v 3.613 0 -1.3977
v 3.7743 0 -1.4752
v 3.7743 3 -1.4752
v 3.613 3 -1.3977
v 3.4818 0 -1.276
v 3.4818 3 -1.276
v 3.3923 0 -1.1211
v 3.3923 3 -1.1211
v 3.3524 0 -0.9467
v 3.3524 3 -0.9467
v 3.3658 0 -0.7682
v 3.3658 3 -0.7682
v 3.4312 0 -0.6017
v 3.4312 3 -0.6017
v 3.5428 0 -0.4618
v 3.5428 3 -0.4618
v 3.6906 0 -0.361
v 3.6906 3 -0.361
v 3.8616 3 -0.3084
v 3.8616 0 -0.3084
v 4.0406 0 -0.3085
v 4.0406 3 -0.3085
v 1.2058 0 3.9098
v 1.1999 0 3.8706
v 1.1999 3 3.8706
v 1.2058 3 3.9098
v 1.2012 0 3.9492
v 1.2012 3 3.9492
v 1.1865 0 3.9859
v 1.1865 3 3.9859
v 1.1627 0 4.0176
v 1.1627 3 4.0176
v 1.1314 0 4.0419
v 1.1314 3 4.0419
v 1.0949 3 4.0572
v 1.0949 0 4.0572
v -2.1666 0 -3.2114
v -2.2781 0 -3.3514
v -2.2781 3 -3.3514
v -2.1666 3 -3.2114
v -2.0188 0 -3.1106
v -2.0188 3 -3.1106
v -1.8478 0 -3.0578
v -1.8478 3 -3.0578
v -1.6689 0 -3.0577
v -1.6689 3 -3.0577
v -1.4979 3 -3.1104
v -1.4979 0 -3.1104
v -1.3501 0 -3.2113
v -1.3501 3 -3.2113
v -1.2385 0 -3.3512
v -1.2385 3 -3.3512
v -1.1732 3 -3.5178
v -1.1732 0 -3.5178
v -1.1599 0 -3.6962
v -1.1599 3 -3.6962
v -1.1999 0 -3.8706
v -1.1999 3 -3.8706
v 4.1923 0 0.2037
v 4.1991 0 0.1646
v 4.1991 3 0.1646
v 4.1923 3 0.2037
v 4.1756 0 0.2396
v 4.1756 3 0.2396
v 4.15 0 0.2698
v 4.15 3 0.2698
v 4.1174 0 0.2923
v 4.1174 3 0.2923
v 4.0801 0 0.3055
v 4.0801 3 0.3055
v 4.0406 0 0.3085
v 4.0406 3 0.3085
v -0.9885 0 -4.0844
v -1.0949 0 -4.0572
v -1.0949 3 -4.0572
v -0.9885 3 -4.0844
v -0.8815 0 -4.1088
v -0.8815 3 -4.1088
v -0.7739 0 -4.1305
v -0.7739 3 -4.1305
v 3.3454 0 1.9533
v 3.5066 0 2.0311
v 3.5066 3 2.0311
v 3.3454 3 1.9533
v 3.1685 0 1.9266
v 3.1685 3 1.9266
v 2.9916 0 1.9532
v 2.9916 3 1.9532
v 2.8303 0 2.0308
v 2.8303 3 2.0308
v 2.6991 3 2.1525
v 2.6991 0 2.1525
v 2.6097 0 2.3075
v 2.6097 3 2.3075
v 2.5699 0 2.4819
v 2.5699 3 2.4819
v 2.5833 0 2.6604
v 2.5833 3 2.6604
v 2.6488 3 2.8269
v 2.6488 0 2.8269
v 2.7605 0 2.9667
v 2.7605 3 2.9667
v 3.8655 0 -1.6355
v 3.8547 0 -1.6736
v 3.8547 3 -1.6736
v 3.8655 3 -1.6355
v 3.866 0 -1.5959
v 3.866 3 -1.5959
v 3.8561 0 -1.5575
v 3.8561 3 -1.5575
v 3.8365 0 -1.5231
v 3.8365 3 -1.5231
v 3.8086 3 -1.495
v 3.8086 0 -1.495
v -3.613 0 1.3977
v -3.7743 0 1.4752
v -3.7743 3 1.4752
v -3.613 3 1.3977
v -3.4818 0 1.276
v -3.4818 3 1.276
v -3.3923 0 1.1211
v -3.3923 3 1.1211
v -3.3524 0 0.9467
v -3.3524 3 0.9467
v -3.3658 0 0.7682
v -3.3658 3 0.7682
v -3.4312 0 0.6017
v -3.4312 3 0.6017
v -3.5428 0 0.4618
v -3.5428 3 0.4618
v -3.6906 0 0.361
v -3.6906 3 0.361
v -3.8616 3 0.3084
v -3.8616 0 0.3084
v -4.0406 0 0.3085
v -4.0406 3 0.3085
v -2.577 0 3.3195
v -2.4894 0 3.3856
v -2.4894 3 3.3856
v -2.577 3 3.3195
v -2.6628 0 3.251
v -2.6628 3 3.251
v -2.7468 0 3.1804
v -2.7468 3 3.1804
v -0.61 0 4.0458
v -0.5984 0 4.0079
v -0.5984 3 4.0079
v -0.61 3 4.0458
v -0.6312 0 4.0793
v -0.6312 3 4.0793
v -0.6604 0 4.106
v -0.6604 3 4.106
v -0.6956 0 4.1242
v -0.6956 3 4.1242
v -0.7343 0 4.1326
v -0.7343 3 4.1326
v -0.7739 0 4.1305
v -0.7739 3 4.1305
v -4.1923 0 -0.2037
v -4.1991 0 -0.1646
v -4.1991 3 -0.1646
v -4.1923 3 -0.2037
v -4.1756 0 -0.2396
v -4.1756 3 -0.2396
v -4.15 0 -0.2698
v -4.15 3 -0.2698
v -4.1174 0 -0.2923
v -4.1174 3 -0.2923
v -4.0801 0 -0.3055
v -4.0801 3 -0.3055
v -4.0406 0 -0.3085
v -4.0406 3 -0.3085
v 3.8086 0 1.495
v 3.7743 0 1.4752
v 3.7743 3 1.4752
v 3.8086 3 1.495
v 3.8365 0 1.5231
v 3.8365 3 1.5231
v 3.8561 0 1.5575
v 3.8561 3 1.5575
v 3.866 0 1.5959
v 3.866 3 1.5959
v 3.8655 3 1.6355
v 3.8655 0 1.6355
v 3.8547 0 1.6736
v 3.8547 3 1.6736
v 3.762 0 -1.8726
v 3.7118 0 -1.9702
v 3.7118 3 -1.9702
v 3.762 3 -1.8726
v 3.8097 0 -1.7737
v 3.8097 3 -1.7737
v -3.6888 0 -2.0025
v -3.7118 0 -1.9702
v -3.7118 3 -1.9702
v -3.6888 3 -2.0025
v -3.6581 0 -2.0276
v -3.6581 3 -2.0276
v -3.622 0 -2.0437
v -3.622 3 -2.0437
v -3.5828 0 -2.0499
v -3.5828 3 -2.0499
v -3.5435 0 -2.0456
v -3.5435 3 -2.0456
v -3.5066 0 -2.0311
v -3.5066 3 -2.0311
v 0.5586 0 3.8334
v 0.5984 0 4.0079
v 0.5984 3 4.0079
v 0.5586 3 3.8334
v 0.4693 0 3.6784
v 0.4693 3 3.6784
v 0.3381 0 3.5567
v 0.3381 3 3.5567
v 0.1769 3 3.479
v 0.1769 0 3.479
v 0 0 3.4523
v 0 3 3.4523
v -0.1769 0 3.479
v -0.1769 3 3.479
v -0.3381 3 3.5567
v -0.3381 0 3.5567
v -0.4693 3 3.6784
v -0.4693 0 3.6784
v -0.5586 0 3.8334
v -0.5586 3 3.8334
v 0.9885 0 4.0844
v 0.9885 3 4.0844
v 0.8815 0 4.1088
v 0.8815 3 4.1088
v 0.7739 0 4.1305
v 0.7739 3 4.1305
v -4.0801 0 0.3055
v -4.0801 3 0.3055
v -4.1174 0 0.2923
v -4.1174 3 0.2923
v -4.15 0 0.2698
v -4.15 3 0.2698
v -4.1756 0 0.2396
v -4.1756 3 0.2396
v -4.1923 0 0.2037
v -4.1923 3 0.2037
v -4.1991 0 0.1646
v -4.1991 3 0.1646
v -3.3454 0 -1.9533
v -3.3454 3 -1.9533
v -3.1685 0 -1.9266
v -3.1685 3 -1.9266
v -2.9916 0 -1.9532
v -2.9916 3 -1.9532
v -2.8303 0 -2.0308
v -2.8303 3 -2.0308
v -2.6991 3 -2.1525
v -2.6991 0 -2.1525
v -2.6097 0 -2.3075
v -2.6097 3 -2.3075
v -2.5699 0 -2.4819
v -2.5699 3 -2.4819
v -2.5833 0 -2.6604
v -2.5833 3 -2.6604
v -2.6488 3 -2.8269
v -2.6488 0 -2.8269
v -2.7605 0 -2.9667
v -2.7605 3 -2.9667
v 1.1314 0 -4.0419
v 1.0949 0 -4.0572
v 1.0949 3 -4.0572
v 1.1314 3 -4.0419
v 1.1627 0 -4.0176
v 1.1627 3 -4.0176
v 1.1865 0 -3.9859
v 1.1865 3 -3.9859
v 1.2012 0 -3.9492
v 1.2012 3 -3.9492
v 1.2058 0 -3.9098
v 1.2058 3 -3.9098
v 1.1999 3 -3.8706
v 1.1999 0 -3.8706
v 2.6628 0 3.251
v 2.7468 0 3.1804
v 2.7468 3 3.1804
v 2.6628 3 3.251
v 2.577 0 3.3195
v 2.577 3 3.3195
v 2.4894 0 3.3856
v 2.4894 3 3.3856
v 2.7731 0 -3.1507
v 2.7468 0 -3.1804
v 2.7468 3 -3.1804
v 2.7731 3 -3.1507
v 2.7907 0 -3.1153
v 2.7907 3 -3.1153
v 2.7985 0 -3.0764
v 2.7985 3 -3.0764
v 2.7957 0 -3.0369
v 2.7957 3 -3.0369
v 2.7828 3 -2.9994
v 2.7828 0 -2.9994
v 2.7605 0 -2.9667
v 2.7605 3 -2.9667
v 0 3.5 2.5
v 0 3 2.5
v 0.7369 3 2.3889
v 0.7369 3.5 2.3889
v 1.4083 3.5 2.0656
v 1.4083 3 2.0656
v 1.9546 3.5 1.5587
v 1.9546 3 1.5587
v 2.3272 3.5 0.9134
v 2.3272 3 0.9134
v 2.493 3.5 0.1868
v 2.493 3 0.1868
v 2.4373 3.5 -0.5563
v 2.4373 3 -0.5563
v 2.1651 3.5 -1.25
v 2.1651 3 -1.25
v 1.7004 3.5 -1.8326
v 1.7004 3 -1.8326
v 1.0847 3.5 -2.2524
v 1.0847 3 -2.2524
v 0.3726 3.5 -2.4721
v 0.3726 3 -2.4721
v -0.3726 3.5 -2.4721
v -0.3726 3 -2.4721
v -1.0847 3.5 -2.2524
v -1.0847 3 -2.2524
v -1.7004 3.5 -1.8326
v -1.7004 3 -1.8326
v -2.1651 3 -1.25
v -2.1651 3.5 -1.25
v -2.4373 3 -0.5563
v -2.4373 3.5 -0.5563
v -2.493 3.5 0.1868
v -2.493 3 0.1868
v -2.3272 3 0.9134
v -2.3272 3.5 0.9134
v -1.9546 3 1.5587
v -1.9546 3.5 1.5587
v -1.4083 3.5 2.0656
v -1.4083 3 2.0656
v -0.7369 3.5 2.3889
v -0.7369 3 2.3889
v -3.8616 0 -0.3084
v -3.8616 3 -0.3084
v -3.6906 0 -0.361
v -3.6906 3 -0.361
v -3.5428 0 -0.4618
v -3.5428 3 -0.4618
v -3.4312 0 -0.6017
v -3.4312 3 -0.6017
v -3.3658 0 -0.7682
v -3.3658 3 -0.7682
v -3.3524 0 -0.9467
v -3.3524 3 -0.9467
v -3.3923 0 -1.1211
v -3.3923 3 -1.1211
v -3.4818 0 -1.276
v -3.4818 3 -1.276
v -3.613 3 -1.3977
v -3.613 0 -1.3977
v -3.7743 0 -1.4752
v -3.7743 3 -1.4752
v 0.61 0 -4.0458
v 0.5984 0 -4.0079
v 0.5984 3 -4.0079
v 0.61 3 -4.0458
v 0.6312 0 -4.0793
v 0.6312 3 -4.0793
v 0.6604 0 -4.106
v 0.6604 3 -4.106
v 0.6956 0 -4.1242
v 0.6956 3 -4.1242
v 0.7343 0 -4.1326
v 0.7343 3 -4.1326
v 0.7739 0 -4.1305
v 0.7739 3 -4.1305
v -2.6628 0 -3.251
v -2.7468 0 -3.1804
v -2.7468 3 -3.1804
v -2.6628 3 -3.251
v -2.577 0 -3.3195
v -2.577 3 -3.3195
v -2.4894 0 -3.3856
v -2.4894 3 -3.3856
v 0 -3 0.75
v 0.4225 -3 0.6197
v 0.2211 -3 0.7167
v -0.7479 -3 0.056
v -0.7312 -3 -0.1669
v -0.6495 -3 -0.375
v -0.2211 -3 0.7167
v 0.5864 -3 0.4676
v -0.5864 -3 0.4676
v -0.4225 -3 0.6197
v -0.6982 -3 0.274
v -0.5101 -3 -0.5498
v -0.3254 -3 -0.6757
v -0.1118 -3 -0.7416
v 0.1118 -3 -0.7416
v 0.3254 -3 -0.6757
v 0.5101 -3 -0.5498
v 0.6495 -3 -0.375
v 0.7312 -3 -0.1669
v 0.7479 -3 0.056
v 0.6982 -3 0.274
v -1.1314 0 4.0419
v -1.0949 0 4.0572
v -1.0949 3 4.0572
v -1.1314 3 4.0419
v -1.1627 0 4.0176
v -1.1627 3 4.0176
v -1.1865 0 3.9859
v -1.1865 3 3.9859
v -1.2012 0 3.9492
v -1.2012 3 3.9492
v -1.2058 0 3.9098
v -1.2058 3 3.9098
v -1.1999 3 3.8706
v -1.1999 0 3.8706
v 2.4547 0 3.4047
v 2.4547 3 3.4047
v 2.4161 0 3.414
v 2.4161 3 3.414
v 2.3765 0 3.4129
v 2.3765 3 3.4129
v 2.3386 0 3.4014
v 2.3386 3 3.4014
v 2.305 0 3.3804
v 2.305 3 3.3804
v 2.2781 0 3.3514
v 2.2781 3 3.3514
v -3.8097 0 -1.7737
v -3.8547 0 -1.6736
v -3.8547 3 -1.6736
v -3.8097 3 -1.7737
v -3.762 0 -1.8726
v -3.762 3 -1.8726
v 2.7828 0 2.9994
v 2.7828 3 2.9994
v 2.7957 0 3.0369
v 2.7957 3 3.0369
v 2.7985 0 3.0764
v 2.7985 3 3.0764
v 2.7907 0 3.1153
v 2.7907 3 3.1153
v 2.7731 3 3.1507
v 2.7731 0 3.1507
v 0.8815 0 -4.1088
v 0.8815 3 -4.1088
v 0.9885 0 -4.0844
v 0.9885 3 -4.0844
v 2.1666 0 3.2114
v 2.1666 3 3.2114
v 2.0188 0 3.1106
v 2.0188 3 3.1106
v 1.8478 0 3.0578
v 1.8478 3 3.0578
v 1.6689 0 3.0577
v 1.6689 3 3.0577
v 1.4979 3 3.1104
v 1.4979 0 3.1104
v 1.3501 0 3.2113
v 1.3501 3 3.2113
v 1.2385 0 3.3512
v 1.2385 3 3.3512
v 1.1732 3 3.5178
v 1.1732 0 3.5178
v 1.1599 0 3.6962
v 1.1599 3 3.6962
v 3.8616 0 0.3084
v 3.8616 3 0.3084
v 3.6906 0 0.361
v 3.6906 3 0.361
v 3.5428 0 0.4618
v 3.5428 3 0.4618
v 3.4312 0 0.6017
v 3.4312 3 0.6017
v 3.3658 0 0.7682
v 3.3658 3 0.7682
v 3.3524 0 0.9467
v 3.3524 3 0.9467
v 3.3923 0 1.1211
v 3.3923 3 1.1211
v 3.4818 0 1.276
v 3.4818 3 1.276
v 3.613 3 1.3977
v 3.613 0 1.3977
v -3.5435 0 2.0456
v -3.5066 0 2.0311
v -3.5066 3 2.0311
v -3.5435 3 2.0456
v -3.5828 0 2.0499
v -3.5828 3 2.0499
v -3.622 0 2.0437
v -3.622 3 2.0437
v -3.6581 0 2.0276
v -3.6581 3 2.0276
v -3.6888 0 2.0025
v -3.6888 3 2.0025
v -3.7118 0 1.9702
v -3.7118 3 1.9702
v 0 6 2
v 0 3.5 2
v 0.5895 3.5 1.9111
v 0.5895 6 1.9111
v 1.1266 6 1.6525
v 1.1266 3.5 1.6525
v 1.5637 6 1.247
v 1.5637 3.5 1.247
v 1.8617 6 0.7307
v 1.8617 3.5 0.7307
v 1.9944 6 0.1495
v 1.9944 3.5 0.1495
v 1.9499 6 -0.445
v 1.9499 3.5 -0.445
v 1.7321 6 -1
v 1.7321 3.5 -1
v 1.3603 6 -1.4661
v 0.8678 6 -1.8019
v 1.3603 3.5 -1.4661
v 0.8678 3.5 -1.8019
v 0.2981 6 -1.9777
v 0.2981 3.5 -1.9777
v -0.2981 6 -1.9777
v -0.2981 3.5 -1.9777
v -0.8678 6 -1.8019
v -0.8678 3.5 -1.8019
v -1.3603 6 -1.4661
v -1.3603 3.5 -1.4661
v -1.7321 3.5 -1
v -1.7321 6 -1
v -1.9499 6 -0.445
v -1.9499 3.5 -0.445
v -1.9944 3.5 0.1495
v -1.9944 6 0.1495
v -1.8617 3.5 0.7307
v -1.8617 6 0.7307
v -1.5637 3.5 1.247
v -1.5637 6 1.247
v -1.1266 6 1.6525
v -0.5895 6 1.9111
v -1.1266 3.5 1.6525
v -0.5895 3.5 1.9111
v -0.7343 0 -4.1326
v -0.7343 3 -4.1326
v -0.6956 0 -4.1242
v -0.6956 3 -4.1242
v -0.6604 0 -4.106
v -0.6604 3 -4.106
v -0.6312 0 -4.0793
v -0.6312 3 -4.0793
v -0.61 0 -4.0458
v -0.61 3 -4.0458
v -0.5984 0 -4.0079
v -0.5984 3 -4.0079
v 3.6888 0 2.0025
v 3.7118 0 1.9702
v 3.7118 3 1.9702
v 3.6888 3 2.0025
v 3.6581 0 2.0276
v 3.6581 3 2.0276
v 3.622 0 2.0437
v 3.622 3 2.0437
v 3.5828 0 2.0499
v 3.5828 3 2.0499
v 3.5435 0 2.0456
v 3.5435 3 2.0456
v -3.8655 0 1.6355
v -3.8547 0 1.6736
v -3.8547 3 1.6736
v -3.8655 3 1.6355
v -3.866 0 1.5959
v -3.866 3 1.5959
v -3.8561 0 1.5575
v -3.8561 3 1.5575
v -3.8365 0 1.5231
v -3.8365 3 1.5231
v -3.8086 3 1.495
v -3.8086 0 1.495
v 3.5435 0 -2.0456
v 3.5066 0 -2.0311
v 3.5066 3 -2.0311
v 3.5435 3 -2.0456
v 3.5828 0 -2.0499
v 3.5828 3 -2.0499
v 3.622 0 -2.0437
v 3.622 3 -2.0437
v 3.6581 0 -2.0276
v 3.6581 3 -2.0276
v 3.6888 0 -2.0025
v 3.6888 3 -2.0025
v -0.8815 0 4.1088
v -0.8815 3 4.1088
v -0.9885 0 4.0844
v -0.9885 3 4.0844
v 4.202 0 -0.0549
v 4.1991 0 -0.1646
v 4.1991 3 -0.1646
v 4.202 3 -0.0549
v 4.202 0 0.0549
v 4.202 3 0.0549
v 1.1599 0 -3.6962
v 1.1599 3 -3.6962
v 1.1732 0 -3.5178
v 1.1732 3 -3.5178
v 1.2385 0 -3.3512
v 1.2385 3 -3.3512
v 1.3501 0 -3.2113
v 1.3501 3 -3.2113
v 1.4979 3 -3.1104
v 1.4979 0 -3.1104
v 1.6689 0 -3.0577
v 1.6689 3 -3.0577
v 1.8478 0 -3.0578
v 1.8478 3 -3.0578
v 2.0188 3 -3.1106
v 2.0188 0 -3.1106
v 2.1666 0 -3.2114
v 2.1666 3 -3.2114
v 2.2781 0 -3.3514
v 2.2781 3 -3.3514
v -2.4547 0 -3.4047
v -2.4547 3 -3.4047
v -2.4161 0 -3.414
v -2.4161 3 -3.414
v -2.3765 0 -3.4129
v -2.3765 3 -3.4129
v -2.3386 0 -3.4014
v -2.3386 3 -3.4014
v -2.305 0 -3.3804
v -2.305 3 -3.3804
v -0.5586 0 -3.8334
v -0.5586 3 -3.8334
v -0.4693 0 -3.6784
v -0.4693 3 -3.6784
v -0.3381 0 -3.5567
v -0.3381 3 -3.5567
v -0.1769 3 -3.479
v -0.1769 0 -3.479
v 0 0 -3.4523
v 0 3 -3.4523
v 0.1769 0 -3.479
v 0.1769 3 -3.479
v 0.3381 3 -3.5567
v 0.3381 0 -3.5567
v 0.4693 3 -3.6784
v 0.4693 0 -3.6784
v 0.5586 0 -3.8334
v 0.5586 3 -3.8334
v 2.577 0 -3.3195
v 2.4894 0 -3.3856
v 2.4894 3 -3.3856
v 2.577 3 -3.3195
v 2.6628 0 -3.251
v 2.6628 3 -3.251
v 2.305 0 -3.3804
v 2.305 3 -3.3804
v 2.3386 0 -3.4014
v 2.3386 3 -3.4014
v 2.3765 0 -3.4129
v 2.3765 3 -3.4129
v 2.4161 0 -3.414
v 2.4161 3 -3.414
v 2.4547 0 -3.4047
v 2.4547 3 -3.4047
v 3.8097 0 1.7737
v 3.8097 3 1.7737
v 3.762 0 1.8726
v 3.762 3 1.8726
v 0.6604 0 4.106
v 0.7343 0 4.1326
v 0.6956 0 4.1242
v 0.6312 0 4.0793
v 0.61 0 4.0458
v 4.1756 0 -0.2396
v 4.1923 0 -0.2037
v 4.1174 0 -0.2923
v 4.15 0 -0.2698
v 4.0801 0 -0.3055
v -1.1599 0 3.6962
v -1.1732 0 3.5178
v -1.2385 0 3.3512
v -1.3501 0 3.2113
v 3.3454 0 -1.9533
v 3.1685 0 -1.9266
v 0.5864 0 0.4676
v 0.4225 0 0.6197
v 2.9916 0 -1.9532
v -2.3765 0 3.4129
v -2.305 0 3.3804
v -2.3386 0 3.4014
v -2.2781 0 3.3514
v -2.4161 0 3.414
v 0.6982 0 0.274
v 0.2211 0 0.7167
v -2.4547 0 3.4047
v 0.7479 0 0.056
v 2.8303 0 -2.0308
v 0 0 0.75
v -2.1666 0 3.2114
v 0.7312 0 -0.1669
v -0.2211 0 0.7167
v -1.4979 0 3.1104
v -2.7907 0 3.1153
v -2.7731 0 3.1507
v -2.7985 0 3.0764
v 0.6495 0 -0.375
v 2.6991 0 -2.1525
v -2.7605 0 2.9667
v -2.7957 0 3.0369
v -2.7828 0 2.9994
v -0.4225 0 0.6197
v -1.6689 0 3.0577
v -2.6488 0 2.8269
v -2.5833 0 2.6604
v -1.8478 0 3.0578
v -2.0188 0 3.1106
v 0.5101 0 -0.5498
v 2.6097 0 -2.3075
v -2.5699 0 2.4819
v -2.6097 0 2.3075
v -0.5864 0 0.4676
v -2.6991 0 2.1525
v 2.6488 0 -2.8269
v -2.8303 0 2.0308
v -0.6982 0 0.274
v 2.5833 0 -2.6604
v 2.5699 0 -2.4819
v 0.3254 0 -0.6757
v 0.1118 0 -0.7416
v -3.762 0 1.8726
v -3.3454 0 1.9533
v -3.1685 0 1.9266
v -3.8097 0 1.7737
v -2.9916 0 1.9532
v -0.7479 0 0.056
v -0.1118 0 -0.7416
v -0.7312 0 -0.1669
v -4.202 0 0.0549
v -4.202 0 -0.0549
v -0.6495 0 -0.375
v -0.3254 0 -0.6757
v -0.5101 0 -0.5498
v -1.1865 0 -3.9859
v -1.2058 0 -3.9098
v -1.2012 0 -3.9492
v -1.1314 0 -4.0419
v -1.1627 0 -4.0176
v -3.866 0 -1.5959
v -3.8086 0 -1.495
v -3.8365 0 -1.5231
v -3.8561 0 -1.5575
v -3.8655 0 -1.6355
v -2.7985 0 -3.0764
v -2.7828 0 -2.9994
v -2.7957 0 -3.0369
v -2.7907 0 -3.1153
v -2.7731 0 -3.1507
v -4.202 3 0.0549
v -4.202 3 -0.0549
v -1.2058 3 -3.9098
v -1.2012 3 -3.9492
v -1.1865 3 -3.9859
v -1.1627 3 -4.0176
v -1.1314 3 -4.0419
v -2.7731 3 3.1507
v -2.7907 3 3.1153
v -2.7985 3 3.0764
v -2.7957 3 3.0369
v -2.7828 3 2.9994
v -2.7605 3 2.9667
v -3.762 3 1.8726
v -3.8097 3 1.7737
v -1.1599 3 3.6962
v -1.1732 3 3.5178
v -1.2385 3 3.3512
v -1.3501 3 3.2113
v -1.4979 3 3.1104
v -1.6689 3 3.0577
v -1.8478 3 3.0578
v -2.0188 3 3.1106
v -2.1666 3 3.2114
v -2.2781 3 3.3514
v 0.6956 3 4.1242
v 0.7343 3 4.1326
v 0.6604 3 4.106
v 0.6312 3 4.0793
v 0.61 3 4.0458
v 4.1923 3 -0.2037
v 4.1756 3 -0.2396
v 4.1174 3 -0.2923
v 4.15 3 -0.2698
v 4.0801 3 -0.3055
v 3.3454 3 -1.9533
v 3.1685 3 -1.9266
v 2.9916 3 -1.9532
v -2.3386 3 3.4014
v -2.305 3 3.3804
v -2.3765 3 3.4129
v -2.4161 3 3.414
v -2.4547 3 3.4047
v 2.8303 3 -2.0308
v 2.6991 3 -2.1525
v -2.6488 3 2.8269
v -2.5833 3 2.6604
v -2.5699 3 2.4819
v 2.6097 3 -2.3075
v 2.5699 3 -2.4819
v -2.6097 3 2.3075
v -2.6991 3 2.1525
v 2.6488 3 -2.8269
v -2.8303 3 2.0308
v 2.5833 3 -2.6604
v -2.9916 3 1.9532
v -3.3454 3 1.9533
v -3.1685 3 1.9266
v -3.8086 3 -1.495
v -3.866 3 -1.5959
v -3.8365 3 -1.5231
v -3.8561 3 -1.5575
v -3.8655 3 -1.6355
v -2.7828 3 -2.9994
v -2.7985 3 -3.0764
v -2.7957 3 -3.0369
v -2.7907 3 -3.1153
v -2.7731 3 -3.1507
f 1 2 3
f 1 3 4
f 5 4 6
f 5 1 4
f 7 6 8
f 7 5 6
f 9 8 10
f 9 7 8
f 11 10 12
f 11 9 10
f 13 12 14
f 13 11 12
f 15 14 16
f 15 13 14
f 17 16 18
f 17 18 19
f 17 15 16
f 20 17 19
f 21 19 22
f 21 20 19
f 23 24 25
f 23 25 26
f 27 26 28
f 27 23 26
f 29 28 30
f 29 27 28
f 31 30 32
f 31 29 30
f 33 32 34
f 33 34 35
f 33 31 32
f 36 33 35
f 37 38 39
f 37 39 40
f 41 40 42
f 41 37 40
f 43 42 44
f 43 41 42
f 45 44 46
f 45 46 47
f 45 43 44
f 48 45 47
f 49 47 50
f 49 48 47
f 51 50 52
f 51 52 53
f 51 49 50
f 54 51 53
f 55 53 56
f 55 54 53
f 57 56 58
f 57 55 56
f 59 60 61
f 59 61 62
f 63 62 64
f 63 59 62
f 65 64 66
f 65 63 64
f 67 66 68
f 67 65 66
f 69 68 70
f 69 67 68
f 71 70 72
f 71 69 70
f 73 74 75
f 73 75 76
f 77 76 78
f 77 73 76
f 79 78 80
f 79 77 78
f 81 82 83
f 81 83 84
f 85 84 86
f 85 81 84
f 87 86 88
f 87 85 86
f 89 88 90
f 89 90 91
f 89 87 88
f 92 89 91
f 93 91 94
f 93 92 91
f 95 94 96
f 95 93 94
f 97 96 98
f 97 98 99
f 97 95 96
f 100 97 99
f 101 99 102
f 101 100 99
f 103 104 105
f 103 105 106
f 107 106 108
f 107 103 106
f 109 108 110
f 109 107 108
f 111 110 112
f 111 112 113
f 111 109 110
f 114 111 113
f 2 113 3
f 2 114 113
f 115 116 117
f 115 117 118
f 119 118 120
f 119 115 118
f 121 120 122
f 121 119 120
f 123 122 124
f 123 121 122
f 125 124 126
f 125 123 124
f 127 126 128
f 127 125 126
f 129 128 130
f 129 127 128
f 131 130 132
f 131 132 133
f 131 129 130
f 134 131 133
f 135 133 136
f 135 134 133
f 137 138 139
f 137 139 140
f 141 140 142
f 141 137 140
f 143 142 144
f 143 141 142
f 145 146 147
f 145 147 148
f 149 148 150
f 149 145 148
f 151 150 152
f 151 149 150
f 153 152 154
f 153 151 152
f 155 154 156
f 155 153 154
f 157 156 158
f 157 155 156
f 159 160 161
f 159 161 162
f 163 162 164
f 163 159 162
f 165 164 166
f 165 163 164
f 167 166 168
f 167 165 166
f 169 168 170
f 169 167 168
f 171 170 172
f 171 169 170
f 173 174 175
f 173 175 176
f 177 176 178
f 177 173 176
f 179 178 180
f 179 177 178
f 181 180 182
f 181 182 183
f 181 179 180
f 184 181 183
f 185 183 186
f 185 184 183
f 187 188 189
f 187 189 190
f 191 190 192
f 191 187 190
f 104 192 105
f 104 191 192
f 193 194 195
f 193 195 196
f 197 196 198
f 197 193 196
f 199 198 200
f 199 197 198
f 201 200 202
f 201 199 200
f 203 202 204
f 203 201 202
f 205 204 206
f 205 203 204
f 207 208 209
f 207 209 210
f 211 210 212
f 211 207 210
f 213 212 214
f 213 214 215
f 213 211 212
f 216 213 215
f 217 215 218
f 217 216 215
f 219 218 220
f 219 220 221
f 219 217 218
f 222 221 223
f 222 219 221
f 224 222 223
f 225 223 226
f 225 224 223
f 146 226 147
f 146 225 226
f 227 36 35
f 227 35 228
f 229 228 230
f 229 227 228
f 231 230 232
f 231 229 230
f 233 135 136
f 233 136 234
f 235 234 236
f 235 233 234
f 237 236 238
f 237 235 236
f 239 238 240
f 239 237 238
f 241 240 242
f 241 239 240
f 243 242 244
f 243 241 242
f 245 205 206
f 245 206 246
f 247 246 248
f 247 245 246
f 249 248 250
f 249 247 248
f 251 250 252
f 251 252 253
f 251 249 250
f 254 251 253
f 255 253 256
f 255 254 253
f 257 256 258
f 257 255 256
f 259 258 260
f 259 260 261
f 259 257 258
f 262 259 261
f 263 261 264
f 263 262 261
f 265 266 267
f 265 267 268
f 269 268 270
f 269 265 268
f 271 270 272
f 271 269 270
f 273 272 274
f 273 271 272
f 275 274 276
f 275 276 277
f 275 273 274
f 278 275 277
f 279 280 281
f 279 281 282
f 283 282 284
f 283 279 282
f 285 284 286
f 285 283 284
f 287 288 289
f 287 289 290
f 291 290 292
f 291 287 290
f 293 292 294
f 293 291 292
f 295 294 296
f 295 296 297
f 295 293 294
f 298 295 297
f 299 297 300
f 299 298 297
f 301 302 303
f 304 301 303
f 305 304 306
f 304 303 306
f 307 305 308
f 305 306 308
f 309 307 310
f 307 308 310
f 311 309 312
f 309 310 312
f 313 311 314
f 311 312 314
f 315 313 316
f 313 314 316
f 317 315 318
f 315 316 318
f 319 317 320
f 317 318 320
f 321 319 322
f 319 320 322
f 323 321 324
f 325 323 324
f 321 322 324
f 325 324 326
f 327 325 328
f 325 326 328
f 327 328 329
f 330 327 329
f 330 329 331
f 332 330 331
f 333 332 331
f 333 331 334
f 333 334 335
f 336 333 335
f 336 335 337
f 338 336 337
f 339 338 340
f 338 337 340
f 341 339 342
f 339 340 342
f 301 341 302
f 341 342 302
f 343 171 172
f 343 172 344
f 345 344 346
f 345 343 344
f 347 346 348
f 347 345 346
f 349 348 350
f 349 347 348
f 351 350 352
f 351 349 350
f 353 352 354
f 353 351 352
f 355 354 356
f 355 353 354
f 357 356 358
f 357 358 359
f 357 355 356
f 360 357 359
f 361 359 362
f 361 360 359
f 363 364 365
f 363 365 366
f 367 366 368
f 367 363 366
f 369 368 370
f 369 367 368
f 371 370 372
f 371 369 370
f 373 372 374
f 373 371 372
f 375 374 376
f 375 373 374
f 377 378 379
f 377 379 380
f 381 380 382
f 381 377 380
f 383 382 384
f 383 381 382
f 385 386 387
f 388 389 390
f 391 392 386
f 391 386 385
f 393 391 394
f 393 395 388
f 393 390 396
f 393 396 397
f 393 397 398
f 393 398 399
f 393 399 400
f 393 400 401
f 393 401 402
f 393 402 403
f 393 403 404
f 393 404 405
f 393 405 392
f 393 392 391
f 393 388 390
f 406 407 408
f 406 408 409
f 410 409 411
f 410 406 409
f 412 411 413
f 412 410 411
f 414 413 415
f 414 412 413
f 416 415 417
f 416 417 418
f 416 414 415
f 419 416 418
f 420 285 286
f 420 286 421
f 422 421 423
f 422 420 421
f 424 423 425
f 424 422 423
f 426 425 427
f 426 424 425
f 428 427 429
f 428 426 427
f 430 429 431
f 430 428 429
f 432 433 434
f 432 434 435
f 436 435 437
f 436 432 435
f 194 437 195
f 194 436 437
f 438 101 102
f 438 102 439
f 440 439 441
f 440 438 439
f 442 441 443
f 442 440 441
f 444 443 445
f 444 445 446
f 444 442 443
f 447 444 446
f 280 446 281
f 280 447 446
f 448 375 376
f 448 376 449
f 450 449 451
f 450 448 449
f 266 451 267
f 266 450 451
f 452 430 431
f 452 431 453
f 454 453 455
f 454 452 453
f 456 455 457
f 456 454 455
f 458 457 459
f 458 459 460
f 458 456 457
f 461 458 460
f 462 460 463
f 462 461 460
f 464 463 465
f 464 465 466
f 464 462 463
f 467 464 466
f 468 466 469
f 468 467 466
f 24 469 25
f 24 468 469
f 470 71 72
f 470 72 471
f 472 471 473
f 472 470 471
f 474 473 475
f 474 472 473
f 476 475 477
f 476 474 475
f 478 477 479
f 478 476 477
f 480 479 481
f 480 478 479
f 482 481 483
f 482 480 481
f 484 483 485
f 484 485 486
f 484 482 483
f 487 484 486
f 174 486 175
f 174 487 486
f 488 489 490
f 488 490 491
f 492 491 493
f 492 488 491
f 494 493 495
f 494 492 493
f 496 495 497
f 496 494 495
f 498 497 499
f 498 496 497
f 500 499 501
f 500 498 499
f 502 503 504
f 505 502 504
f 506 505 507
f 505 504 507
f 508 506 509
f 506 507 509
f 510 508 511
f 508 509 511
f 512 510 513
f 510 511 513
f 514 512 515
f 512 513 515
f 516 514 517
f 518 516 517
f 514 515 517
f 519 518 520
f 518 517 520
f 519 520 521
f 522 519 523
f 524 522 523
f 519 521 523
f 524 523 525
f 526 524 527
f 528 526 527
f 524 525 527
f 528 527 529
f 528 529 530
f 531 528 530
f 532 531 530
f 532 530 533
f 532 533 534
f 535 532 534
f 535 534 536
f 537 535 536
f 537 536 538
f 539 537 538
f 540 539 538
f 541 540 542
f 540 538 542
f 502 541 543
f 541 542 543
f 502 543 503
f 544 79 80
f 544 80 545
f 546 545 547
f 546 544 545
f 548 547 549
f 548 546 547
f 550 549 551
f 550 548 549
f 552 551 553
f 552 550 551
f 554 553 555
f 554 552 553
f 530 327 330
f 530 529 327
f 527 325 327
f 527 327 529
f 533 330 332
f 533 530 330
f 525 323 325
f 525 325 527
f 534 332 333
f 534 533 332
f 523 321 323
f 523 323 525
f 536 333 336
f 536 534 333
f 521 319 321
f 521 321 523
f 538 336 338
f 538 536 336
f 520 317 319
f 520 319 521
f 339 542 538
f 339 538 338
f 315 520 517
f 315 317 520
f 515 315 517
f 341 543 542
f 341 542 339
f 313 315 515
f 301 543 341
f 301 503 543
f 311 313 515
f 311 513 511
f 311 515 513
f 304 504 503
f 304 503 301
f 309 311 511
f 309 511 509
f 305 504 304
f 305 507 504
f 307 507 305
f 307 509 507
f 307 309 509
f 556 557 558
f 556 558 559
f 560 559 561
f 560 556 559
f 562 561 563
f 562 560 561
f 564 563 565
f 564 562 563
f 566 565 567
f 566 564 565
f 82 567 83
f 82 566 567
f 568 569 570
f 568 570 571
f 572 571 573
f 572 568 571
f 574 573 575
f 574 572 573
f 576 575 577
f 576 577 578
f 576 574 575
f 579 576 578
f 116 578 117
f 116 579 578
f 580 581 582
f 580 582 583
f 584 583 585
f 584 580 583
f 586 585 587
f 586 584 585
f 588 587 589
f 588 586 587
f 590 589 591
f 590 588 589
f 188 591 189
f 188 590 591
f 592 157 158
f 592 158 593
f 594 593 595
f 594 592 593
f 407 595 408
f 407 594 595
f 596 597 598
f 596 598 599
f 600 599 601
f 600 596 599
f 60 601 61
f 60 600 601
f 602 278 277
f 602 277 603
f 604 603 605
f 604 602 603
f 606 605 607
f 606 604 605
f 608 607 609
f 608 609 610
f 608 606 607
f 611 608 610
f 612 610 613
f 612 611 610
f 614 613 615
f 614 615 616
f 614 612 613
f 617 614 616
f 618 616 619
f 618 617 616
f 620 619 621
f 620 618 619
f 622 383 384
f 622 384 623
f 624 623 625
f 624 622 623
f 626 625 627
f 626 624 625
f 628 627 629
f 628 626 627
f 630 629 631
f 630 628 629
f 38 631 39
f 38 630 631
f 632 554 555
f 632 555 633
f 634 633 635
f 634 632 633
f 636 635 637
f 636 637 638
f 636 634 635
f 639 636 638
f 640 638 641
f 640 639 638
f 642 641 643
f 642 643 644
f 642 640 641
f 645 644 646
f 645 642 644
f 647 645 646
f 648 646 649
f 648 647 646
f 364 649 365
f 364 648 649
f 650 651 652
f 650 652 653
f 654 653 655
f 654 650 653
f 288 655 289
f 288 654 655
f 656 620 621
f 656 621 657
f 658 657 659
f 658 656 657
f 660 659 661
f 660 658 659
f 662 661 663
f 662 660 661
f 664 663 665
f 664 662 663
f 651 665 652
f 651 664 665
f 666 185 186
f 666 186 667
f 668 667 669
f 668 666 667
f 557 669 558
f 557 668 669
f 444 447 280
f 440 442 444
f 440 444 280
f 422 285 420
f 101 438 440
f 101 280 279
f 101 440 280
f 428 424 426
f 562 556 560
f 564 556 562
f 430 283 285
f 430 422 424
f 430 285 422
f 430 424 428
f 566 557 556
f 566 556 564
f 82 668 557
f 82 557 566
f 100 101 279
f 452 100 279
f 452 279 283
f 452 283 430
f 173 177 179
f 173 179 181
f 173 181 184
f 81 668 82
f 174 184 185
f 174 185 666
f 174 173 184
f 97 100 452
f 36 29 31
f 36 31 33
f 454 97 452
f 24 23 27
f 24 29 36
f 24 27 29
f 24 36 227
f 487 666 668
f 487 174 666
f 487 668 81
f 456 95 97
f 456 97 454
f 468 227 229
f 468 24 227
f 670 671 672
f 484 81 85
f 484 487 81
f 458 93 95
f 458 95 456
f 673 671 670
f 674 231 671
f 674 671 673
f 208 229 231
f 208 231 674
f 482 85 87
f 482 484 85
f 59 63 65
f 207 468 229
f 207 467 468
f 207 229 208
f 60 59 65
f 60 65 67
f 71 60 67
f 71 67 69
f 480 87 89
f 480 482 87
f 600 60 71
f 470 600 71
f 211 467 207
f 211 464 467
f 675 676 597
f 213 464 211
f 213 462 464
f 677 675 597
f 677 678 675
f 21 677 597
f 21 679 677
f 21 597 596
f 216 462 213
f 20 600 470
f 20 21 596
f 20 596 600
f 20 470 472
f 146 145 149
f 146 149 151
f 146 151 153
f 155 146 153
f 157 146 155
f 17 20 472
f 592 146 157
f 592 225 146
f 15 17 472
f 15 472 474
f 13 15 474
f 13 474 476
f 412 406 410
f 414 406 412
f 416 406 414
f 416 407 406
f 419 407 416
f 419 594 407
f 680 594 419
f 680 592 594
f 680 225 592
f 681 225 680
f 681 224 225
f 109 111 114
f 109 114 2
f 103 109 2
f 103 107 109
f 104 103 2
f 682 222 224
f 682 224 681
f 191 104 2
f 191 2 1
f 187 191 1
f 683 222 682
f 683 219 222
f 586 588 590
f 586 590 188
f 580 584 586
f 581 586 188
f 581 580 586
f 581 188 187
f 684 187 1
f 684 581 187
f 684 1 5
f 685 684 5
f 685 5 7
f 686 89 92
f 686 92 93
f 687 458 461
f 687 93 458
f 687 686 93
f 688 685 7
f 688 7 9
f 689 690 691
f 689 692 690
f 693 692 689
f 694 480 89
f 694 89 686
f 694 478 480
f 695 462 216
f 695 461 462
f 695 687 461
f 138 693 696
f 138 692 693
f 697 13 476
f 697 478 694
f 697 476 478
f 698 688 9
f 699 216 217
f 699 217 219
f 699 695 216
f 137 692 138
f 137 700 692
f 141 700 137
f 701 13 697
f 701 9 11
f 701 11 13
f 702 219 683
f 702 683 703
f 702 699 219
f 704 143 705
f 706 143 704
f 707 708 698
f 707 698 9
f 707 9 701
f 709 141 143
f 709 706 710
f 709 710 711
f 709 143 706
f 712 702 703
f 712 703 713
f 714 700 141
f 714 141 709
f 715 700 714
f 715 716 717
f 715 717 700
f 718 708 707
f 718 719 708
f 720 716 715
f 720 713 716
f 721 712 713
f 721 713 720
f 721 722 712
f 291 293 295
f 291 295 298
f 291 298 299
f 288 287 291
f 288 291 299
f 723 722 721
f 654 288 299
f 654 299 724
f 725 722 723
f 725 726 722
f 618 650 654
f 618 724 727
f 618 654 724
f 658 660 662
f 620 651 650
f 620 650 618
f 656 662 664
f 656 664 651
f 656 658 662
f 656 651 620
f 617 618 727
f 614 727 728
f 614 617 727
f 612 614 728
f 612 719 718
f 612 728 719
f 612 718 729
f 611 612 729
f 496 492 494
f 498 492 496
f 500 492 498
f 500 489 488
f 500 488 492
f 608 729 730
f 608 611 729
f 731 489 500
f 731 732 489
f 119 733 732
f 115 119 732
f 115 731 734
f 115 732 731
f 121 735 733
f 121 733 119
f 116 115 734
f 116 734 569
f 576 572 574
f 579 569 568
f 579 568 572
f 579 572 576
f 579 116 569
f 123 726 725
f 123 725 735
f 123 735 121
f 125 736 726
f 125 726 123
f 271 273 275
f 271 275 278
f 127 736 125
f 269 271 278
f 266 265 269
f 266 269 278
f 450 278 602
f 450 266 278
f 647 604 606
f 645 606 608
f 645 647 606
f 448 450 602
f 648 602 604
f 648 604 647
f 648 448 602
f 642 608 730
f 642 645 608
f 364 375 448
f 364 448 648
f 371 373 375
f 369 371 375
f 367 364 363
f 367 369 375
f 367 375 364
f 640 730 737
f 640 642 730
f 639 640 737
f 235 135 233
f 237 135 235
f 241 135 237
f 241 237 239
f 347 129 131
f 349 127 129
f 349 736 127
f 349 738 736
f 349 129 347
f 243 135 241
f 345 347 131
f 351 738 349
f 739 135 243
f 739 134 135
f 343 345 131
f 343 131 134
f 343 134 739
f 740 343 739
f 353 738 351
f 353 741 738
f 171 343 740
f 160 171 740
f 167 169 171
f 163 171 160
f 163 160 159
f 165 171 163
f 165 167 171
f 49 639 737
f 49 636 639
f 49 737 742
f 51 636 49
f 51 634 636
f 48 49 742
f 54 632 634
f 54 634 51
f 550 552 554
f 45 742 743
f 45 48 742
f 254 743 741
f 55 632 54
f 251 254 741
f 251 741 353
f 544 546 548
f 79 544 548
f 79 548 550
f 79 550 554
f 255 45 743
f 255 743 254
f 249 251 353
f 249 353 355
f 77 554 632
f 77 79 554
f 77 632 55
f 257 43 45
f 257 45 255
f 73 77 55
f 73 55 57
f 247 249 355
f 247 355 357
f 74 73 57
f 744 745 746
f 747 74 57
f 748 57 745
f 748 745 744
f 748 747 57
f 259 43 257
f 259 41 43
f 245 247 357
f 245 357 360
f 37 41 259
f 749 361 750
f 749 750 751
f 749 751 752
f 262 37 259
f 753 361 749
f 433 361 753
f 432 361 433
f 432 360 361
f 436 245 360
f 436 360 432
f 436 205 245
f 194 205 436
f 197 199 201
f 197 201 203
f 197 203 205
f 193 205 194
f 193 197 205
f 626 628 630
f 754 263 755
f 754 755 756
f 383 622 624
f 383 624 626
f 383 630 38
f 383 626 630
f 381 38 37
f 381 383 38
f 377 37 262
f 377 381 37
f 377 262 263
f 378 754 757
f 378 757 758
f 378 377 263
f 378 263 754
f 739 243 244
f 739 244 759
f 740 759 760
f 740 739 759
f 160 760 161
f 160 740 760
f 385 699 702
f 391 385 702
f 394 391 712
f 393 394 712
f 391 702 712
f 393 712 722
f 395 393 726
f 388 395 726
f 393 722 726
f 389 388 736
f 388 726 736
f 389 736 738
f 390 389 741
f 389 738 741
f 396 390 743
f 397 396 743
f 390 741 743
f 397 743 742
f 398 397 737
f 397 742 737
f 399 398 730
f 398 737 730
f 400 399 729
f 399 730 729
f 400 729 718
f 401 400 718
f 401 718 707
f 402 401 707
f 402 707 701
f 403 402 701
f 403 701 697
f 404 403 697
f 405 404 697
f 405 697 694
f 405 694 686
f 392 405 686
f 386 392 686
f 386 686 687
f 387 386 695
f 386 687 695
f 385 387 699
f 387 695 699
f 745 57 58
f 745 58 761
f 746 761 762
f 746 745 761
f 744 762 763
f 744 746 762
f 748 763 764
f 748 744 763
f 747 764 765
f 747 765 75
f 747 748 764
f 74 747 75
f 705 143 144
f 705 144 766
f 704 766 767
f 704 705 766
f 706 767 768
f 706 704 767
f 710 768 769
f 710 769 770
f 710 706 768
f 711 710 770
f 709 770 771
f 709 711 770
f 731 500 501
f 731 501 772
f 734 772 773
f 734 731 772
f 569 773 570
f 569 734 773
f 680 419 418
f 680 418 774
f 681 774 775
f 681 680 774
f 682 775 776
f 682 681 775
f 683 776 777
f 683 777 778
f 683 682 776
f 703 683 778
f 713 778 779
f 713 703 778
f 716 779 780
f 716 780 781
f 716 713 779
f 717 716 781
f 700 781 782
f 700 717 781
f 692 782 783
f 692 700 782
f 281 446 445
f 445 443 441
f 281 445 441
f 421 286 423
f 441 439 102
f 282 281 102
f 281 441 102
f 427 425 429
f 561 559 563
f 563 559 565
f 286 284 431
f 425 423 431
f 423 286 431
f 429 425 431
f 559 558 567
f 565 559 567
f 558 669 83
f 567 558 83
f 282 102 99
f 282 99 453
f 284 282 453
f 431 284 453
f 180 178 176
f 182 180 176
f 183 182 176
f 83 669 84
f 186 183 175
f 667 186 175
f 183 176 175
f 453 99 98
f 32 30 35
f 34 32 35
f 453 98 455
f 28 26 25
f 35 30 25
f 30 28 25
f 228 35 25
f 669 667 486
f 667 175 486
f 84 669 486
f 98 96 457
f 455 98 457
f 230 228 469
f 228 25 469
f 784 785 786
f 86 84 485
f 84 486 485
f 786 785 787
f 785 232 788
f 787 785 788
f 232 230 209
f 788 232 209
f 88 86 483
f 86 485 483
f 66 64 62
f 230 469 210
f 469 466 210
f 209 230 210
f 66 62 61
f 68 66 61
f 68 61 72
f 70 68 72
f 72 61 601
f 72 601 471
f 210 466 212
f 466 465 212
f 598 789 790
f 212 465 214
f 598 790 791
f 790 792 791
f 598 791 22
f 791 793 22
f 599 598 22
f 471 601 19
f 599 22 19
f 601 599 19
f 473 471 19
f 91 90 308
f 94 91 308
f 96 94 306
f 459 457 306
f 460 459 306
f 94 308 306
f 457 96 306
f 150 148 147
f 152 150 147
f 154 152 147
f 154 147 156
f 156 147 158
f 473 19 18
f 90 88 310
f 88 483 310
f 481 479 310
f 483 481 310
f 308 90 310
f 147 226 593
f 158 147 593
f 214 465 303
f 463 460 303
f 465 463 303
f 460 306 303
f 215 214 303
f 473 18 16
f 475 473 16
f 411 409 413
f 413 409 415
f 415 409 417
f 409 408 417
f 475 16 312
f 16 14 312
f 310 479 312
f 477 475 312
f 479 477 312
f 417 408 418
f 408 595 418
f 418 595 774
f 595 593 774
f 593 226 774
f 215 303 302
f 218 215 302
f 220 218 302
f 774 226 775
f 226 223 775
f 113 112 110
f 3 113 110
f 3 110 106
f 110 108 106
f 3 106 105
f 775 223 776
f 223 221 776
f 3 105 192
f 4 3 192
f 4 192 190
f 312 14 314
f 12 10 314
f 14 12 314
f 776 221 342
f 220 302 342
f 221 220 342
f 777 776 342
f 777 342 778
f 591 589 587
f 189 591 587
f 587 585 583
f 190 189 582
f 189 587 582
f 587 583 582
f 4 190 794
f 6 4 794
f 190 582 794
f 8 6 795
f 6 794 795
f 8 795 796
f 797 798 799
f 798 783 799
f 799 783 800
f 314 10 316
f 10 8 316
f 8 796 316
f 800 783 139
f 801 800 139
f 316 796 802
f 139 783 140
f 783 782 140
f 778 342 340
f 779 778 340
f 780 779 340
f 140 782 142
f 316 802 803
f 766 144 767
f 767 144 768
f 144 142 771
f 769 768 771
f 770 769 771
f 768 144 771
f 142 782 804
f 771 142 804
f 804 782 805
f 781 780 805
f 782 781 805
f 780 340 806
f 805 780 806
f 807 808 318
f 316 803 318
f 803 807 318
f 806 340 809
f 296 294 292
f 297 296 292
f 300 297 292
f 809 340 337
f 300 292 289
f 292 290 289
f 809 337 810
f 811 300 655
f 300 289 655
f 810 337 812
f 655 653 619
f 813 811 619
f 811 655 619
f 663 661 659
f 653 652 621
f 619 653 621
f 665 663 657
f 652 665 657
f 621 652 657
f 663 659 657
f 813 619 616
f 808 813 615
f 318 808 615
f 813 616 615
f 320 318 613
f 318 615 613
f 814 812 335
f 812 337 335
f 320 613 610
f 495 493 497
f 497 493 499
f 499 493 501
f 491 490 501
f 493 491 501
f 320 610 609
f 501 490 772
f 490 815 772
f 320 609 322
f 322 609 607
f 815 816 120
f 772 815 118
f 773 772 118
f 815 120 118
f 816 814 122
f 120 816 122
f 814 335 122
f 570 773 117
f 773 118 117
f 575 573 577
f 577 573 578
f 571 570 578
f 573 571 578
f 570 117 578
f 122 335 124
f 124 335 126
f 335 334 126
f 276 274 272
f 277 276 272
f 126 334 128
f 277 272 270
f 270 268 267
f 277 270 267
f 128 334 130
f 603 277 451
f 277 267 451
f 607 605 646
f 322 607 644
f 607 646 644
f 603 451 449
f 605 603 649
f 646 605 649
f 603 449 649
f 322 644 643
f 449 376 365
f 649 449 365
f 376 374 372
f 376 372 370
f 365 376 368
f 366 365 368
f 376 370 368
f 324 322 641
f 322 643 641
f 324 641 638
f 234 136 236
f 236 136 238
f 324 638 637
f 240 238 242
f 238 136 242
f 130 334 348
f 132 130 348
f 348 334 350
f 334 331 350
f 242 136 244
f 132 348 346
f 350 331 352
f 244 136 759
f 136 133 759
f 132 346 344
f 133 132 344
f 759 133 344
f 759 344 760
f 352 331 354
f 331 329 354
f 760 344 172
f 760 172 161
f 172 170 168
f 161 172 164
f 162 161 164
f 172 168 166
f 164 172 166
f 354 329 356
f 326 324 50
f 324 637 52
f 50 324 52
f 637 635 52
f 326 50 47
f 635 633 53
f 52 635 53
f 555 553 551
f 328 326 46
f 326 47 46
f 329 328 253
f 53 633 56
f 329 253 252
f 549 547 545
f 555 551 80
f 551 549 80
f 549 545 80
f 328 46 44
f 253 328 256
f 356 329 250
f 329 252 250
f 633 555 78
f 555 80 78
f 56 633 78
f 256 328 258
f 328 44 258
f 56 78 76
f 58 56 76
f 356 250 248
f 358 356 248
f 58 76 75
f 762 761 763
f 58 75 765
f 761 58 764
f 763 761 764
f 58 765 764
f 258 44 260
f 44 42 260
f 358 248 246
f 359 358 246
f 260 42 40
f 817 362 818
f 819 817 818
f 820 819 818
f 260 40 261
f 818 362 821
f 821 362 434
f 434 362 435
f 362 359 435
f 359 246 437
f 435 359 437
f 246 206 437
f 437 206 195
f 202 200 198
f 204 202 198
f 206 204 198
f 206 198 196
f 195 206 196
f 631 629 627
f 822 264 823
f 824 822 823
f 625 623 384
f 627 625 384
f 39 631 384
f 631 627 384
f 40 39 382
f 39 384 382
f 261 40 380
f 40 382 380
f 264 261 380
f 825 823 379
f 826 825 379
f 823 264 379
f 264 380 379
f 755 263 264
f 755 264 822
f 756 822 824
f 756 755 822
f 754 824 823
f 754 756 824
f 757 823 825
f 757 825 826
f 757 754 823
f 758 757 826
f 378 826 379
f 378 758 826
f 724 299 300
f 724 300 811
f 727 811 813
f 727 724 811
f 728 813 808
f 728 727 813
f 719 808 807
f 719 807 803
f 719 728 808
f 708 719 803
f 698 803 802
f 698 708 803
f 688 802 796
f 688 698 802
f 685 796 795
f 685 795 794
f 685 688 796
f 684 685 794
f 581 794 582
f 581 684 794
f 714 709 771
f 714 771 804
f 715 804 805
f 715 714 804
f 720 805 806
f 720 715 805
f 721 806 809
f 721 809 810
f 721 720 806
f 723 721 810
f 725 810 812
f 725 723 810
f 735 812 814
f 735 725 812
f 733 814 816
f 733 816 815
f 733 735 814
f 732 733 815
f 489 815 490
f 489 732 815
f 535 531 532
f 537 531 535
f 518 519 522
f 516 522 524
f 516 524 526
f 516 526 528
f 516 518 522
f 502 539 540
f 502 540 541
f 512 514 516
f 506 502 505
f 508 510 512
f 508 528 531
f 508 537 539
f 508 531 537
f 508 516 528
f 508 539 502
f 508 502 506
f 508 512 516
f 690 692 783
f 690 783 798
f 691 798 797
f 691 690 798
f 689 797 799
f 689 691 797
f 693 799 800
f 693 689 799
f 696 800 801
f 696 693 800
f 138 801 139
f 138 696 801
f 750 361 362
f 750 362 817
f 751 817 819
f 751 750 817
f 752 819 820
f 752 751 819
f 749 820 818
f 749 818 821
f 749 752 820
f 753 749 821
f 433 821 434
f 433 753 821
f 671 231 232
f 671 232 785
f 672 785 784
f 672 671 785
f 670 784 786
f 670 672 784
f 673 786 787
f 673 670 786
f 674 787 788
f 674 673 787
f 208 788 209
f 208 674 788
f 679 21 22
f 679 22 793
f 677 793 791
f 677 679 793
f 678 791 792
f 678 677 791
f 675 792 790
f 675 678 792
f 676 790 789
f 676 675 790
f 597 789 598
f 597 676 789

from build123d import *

# Parameters (mm, degrees)
BOSS_EXTRUDE1_DEPTH = 3
SKETCH2_R           = 0.75
BOSS_EXTRUDE2_DEPTH = 3
SKETCH3_R           = 2.5
BOSS_EXTRUDE3_DEPTH = 0.5
SKETCH4_R           = 2
BOSS_EXTRUDE4_DEPTH = 2.5


with BuildPart() as part:
    # Sketch1 → Boss-Extrude1 (new body)
    with BuildSketch(Plane(origin=(0, 0, 0), x_dir=(1, 0, 0), z_dir=(0, 1, 0))):
        with BuildLine():
            ThreePointArc((0.59835355, 4.007919609), (0.660413192, 4.106024801), (0.773897857, 4.130463677))
            ThreePointArc((0.773897857, 4.130463677), (0.935108267, 4.096977009), (1.094883149, 4.057200879))
            ThreePointArc((1.094883149, 4.057200879), (1.186525668, 3.985943061), (1.199873226, 3.870626668))
            ThreePointArc((1.199873226, 3.870626668), (1.497913497, 3.110449426), (2.278069066, 3.351394917))
            ThreePointArc((2.278069066, 3.351394917), (2.376549119, 3.412857971), (2.4893989, 3.385637488))
            ThreePointArc((2.4893989, 3.385637488), (2.62011514, 3.285520466), (2.746809119, 3.180359688))
            ThreePointArc((2.746809119, 3.180359688), (2.798458567, 3.076396414), (2.760450393, 2.966708646))
            ThreePointArc((2.760450393, 2.966708646), (2.699146854, 2.152497789), (3.506585066, 2.03108536))
            ThreePointArc((3.506585066, 2.03108536), (3.621980347, 2.043732765), (3.711843962, 1.970244271))
            ThreePointArc((3.711843962, 1.970244271), (3.786176077, 1.823326301), (3.854695856, 1.673609257))
            ThreePointArc((3.854695856, 1.673609257), (3.856122426, 1.557531728), (3.774286506, 1.475197592))
            ThreePointArc((3.774286506, 1.475197592), (3.365781075, 0.768217567), (4.040578887, 0.308494438))
            ThreePointArc((4.040578887, 0.308494438), (4.150033947, 0.269821219), (4.199112803, 0.164620014))
            ThreePointArc((4.199112803, 0.164620014), (4.202338407, 0), (4.199112803, -0.164620014))
            ThreePointArc((4.199112803, -0.164620014), (4.150033947, -0.269821219), (4.040578887, -0.308494438))
            ThreePointArc((4.040578887, -0.308494438), (3.365781075, -0.768217567), (3.774286506, -1.475197592))
            ThreePointArc((3.774286506, -1.475197592), (3.856122426, -1.557531728), (3.854695856, -1.673609257))
            ThreePointArc((3.854695856, -1.673609257), (3.786176077, -1.823326301), (3.711843962, -1.970244271))
            ThreePointArc((3.711843962, -1.970244271), (3.621980347, -2.043732765), (3.506585066, -2.03108536))
            ThreePointArc((3.506585066, -2.03108536), (2.699146854, -2.152497789), (2.760450393, -2.966708646))
            ThreePointArc((2.760450393, -2.966708646), (2.798458567, -3.076396414), (2.746809119, -3.180359688))
            ThreePointArc((2.746809119, -3.180359688), (2.62011514, -3.285520466), (2.4893989, -3.385637488))
            ThreePointArc((2.4893989, -3.385637488), (2.376549119, -3.412857971), (2.278069066, -3.351394917))
            ThreePointArc((2.278069066, -3.351394917), (1.497913497, -3.110449426), (1.199873226, -3.870626668))
            ThreePointArc((1.199873226, -3.870626668), (1.186525668, -3.985943061), (1.094883149, -4.057200879))
            ThreePointArc((1.094883149, -4.057200879), (0.935108267, -4.096977009), (0.773897857, -4.130463677))
            ThreePointArc((0.773897857, -4.130463677), (0.660413192, -4.106024801), (0.59835355, -4.007919609))
            ThreePointArc((0.59835355, -4.007919609), (0, -3.452338407), (-0.59835355, -4.007919609))
            ThreePointArc((-0.59835355, -4.007919609), (-0.660413192, -4.106024801), (-0.773897857, -4.130463677))
            ThreePointArc((-0.773897857, -4.130463677), (-0.935108267, -4.096977009), (-1.094883149, -4.057200879))
            ThreePointArc((-1.094883149, -4.057200879), (-1.186525668, -3.985943061), (-1.199873226, -3.870626668))
            ThreePointArc((-1.199873226, -3.870626668), (-1.497913497, -3.110449426), (-2.278069066, -3.351394917))
            ThreePointArc((-2.278069066, -3.351394917), (-2.376549119, -3.412857971), (-2.4893989, -3.385637488))
            ThreePointArc((-2.4893989, -3.385637488), (-2.62011514, -3.285520466), (-2.746809119, -3.180359688))
            ThreePointArc((-2.746809119, -3.180359688), (-2.798458567, -3.076396414), (-2.760450393, -2.966708646))
            ThreePointArc((-2.760450393, -2.966708646), (-2.699146854, -2.152497789), (-3.506585066, -2.03108536))
            ThreePointArc((-3.506585066, -2.03108536), (-3.621980347, -2.043732765), (-3.711843962, -1.970244271))
            ThreePointArc((-3.711843962, -1.970244271), (-3.786176077, -1.823326301), (-3.854695856, -1.673609257))
            ThreePointArc((-3.854695856, -1.673609257), (-3.856122426, -1.557531728), (-3.774286506, -1.475197592))
            ThreePointArc((-3.774286506, -1.475197592), (-3.365781075, -0.768217567), (-4.040578887, -0.308494438))
            ThreePointArc((-4.040578887, -0.308494438), (-4.150033947, -0.269821219), (-4.199112803, -0.164620014))
            ThreePointArc((-4.199112803, -0.164620014), (-4.202338407, 0), (-4.199112803, 0.164620014))
            ThreePointArc((-4.199112803, 0.164620014), (-4.150033947, 0.269821219), (-4.040578887, 0.308494438))
            ThreePointArc((-4.040578887, 0.308494438), (-3.365781075, 0.768217567), (-3.774286506, 1.475197592))
            ThreePointArc((-3.774286506, 1.475197592), (-3.856122426, 1.557531728), (-3.854695856, 1.673609257))
            ThreePointArc((-3.854695856, 1.673609257), (-3.786176077, 1.823326301), (-3.711843962, 1.970244271))
            ThreePointArc((-3.711843962, 1.970244271), (-3.621980347, 2.043732765), (-3.506585066, 2.03108536))
            ThreePointArc((-3.506585066, 2.03108536), (-2.699146854, 2.152497789), (-2.760450393, 2.966708646))
            ThreePointArc((-2.760450393, 2.966708646), (-2.798458567, 3.076396414), (-2.746809119, 3.180359688))
            ThreePointArc((-2.746809119, 3.180359688), (-2.62011514, 3.285520466), (-2.4893989, 3.385637488))
            ThreePointArc((-2.4893989, 3.385637488), (-2.376549119, 3.412857971), (-2.278069066, 3.351394917))
            ThreePointArc((-2.278069066, 3.351394917), (-1.497913497, 3.110449426), (-1.199873226, 3.870626668))
            ThreePointArc((-1.199873226, 3.870626668), (-1.186525668, 3.985943061), (-1.094883149, 4.057200879))
            ThreePointArc((-1.094883149, 4.057200879), (-0.935108267, 4.096977009), (-0.773897857, 4.130463677))
            ThreePointArc((-0.773897857, 4.130463677), (-0.660413192, 4.106024801), (-0.59835355, 4.007919609))
            ThreePointArc((-0.59835355, 4.007919609), (0, 3.452338407), (0.59835355, 4.007919609))
        make_face()
    extrude(amount=BOSS_EXTRUDE1_DEPTH)

    # Sketch2 → Boss-Extrude2 (add)
    with BuildSketch(Plane(origin=(0, 0, 0), x_dir=(-1, 0, 0), z_dir=(0, -1, 0))):
        with Locations(Location((0, 0, 0), (0, 0, 270))):
            Circle(SKETCH2_R)
    extrude(amount=BOSS_EXTRUDE2_DEPTH)

    # Sketch3 → Boss-Extrude3 (add)
    with BuildSketch(Plane(origin=(0, 3, 0), x_dir=(1, 0, 0), z_dir=(0, 1, 0))):
        with Locations(Location((0, 0, 0), (0, 0, 270))):
            Circle(SKETCH3_R)
    extrude(amount=BOSS_EXTRUDE3_DEPTH)

    # Sketch4 → Boss-Extrude4 (add)
    with BuildSketch(Plane(origin=(0, 3.5, 0), x_dir=(1, 0, 0), z_dir=(0, 1, 0))):
        with Locations(Location((0, 0, 0), (0, 0, 270))):
            Circle(SKETCH4_R)
    extrude(amount=BOSS_EXTRUDE4_DEPTH)


solid = part.part
